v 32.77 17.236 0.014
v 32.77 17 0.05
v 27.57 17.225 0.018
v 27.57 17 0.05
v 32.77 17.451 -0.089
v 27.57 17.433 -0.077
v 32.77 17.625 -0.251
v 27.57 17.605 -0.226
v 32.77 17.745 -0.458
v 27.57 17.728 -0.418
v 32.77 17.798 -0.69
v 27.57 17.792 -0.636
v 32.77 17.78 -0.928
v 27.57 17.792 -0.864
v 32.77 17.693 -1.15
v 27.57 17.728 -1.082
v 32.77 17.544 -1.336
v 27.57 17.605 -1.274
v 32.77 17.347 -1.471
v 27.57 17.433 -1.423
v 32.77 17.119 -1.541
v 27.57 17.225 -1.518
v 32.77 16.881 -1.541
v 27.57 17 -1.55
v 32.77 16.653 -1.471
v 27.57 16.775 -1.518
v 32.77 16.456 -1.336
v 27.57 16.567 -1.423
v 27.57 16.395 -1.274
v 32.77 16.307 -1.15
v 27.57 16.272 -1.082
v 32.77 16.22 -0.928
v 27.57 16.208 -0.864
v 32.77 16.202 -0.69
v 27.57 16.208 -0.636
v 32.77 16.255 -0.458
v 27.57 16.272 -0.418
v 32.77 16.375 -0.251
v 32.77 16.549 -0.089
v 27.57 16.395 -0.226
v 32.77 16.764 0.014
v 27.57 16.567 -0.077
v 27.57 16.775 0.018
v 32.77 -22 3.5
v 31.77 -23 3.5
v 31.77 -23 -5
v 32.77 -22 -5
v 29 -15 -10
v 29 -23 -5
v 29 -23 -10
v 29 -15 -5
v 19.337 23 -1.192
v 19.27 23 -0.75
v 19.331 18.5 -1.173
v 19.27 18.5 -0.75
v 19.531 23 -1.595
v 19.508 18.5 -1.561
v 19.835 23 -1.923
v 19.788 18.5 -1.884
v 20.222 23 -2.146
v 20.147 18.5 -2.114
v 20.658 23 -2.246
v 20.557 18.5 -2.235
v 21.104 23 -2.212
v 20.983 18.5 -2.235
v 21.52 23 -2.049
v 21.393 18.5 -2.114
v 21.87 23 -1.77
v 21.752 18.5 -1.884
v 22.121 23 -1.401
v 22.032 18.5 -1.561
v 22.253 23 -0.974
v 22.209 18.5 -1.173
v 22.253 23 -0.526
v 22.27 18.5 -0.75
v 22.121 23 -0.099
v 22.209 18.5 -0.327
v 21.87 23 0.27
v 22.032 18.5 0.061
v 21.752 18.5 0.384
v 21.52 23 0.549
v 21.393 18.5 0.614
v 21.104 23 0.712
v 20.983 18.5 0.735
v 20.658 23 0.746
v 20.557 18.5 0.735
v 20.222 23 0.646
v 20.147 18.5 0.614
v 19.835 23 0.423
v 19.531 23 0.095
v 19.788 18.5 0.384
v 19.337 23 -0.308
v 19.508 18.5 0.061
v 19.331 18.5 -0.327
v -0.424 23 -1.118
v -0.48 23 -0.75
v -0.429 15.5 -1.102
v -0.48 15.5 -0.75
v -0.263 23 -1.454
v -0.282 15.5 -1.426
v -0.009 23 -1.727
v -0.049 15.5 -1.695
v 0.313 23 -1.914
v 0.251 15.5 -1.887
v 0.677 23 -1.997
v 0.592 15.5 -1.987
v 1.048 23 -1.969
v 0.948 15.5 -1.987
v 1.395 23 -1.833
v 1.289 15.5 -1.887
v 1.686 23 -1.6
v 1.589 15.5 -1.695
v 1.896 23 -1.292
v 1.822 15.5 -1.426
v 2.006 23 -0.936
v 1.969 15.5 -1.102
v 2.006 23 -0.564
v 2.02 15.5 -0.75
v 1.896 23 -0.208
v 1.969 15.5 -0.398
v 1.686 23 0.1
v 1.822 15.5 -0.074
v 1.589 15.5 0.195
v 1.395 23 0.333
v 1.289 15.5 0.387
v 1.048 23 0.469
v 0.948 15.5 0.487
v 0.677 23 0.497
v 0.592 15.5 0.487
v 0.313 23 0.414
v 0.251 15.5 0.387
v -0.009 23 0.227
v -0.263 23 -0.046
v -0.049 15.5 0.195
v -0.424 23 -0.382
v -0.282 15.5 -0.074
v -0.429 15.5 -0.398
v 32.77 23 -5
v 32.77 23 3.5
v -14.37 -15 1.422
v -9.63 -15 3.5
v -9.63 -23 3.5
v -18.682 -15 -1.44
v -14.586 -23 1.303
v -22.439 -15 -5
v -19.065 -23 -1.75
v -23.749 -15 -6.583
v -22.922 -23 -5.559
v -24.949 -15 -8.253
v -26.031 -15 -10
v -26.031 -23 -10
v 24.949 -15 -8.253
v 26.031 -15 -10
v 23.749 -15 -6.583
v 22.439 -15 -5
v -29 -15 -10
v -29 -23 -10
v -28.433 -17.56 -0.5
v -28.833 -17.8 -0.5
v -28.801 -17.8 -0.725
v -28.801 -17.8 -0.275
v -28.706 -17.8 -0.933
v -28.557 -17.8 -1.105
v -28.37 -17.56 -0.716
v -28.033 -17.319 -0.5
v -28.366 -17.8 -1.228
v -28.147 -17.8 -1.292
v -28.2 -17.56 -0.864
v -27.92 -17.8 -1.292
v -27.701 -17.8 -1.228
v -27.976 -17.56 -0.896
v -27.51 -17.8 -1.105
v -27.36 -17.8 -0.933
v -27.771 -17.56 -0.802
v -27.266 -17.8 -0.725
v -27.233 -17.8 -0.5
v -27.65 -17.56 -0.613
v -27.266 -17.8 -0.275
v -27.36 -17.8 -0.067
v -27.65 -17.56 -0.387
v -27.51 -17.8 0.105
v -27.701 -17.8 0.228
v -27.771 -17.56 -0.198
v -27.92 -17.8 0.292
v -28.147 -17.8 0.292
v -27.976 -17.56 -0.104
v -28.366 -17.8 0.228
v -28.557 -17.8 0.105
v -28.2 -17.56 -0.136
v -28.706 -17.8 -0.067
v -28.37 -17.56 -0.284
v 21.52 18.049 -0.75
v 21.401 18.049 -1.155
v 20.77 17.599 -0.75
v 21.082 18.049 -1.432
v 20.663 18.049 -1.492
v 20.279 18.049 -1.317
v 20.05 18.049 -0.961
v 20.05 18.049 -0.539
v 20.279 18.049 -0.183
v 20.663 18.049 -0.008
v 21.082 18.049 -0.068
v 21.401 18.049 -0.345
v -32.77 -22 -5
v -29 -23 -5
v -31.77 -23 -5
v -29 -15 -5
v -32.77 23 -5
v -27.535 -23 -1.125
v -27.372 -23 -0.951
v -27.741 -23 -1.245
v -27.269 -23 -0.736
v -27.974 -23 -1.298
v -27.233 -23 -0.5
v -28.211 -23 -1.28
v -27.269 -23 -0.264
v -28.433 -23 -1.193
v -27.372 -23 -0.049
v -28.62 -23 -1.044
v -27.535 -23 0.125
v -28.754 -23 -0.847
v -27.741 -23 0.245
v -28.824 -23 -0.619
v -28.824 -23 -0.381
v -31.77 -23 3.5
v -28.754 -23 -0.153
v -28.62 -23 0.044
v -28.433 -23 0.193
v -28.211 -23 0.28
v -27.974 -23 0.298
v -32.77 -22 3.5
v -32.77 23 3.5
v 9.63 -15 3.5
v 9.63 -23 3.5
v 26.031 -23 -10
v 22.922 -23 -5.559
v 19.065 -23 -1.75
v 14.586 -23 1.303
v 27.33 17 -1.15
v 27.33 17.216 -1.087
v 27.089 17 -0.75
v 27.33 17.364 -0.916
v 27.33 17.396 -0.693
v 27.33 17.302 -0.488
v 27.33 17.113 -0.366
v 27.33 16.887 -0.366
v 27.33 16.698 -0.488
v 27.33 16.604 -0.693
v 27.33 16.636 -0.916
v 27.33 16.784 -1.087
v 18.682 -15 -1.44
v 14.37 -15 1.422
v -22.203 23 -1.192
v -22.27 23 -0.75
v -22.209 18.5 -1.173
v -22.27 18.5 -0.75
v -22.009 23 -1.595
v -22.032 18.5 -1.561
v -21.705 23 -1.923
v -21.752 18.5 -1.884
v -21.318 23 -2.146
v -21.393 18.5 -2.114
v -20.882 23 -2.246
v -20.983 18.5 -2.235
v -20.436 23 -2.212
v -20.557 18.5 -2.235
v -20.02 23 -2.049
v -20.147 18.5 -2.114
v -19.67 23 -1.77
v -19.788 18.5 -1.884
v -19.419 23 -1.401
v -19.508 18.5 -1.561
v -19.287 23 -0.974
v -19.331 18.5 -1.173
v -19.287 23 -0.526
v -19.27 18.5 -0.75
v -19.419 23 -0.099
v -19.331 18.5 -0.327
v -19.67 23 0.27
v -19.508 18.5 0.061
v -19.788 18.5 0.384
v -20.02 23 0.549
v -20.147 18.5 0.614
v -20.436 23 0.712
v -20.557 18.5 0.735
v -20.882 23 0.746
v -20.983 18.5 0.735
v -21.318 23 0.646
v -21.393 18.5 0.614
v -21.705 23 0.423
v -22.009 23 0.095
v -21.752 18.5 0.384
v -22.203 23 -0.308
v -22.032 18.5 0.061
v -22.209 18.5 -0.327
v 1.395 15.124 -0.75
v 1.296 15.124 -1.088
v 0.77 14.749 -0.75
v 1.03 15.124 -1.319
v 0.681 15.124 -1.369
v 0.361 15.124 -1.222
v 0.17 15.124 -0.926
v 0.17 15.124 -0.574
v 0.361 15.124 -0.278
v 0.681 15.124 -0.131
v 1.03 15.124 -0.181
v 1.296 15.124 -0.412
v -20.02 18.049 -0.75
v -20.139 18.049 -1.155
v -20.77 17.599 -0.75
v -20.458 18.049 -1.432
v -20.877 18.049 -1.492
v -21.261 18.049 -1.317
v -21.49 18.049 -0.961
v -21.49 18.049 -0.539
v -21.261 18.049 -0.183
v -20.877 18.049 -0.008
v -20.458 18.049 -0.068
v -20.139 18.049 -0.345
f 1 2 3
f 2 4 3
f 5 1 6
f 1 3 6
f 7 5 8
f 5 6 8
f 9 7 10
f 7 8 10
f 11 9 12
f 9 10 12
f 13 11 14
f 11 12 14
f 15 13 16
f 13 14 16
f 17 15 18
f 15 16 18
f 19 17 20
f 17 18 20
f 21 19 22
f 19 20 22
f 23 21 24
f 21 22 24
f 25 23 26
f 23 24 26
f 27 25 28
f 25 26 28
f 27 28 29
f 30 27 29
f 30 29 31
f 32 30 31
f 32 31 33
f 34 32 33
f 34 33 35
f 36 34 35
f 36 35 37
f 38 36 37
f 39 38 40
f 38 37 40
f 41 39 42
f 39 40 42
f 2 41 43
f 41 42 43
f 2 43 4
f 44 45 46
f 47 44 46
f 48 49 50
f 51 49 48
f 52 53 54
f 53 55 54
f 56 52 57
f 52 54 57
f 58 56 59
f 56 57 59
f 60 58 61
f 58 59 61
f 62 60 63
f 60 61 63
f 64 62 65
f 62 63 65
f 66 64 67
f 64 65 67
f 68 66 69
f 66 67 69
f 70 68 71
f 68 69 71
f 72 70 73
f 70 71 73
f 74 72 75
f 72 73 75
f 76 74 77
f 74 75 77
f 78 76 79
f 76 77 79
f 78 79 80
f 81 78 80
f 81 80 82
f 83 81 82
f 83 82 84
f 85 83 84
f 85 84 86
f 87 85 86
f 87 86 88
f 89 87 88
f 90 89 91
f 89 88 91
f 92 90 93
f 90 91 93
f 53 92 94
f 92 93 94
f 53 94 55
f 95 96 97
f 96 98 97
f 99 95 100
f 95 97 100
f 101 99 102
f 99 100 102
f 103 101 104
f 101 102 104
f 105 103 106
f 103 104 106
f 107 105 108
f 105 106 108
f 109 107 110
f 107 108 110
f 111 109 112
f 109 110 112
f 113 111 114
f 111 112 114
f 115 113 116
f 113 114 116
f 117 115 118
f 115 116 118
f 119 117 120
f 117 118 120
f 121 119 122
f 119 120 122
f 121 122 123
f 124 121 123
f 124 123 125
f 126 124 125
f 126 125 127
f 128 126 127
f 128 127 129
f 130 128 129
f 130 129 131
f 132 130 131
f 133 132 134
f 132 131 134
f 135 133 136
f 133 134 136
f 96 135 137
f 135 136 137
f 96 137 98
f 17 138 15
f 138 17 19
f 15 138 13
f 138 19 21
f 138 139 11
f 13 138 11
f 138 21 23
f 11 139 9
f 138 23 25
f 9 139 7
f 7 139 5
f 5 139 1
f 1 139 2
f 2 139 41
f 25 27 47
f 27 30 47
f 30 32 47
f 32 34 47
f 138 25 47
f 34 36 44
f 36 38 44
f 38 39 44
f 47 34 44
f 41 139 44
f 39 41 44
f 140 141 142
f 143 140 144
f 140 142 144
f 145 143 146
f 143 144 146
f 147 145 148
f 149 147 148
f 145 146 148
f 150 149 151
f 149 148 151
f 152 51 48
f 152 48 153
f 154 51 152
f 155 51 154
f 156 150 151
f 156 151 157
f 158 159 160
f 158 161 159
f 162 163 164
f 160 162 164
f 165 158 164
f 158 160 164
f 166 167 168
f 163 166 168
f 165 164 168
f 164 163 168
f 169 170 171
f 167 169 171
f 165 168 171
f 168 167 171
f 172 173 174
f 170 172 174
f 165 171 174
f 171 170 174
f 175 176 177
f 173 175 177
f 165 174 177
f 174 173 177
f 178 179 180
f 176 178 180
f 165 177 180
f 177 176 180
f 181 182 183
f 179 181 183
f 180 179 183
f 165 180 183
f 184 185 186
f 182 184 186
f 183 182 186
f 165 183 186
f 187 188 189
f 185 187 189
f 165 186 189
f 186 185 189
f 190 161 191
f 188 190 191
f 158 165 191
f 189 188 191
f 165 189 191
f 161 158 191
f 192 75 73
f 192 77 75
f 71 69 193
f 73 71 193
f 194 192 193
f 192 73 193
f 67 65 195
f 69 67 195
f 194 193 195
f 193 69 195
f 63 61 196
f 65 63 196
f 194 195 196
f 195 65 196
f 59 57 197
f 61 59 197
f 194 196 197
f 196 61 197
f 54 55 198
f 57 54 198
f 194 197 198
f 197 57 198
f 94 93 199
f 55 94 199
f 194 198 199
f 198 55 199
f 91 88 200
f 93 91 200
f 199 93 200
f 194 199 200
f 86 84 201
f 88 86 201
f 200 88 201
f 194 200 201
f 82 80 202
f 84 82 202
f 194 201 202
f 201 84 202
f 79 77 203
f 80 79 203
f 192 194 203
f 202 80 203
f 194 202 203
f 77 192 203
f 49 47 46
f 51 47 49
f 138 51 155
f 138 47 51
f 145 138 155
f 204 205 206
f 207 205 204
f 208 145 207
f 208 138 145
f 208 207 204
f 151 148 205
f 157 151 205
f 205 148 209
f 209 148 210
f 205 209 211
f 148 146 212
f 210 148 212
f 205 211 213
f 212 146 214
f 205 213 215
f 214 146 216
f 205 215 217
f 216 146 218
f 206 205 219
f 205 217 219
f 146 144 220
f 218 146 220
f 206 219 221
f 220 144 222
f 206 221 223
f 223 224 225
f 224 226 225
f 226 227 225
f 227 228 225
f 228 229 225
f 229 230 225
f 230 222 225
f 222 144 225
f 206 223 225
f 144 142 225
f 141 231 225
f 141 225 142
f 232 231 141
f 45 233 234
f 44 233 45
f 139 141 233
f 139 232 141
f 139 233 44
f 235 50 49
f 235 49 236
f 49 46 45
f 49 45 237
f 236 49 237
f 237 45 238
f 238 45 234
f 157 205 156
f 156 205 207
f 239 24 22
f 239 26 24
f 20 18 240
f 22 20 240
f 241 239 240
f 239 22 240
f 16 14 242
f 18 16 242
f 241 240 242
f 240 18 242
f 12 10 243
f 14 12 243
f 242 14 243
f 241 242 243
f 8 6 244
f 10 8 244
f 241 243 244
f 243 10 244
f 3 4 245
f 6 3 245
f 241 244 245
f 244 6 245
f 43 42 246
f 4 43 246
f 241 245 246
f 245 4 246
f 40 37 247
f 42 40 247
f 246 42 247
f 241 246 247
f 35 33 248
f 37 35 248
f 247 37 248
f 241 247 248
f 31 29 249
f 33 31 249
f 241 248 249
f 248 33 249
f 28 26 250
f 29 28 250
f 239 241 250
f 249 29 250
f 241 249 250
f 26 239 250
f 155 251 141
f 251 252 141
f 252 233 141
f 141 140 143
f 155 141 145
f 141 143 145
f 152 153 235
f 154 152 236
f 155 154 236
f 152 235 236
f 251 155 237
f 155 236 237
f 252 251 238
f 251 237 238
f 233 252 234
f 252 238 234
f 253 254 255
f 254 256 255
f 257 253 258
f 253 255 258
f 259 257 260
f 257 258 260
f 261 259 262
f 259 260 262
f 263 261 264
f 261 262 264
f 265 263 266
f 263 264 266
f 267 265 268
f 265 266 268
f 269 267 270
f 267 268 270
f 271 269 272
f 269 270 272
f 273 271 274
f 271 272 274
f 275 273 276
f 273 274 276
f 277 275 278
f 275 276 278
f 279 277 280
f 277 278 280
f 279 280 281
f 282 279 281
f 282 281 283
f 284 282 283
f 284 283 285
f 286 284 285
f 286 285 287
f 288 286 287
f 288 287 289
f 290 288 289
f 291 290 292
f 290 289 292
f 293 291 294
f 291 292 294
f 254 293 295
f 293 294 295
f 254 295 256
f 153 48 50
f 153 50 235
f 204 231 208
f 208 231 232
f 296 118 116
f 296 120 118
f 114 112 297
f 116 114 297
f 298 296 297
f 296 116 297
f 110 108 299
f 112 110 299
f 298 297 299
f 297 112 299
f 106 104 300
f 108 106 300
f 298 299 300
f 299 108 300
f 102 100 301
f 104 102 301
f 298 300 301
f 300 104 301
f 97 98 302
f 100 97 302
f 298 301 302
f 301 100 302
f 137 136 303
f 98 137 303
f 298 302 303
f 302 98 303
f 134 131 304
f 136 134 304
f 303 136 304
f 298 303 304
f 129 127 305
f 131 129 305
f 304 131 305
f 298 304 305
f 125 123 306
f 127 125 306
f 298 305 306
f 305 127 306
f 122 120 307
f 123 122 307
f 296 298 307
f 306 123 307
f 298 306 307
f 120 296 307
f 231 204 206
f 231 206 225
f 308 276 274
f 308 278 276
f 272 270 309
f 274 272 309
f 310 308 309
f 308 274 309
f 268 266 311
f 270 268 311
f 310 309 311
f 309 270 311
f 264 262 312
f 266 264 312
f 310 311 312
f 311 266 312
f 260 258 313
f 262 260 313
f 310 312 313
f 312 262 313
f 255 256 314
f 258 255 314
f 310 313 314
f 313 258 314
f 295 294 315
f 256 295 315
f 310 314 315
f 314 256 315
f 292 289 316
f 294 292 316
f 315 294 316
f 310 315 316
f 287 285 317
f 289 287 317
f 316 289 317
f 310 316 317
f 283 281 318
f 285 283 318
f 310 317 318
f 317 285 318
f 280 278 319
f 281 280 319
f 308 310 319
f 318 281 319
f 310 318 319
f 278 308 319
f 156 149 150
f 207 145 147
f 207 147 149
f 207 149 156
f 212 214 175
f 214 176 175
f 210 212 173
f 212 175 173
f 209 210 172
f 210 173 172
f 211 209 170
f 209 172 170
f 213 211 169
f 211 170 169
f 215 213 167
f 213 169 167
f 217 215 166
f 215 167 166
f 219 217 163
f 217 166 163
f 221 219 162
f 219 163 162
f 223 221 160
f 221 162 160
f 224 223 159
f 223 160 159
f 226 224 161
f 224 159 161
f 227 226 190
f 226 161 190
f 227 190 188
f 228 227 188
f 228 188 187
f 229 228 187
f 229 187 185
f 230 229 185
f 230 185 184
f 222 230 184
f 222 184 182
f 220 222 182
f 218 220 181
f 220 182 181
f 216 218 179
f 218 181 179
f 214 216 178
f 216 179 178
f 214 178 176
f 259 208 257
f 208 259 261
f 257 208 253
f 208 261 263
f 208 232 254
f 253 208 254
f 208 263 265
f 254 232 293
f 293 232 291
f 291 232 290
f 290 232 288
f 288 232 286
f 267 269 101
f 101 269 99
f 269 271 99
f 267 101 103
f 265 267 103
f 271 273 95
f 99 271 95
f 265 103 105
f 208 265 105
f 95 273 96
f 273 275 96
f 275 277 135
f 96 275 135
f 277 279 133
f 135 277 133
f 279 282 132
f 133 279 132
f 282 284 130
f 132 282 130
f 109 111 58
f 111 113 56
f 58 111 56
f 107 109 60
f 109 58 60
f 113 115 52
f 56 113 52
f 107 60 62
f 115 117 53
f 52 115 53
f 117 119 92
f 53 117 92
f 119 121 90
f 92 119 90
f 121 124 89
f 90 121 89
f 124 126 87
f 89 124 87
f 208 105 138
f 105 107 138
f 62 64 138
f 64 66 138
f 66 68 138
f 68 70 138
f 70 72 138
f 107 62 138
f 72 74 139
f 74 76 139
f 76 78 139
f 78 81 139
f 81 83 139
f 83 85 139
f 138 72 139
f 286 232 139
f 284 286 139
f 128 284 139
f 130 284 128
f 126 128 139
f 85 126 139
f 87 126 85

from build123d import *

# Parameters (mm, degrees)
SKETCH1_W                 = 65.54
SKETCH1_H                 = 46
BOSS_EXTRUDE1_DEPTH       = 3.5
SKETCH2_W                 = 58
SKETCH2_H                 = 8
BOSS_EXTRUDE2_DEPTH       = 10
CUT_EXTRUDE1_DEPTH        = 8
BOSS_EXTRUDE3_DEPTH       = 5
CHAMFER1_SIZE             = 1
F_3_0MM_DOWEL_HOLE1_D     = 3
F_3_0MM_DOWEL_HOLE1_DEPTH = 4.5
F_3_0MM_DOWEL_HOLE1_TIP   = 0.901290929
M3X0_5_TAPPED_HOLE1_D     = 2.5
M3X0_5_TAPPED_HOLE1_DEPTH = 7.5
M3X0_5_TAPPED_HOLE1_TIP   = 0.751075774
M2X0_4_TAPPED_HOLE1_D     = 1.6
M2X0_4_TAPPED_HOLE1_DEPTH = 5.2
M2X0_4_TAPPED_HOLE1_TIP   = 0.480688495
M2X0_4_TAPPED_HOLE2_D     = 1.6
M2X0_4_TAPPED_HOLE2_DEPTH = 5.2
M2X0_4_TAPPED_HOLE2_TIP   = 0.480688495


with BuildPart() as part:
    # Sketch1 → Boss-Extrude1 (new body)
    with BuildSketch(Plane.XY):
        Rectangle(SKETCH1_W, SKETCH1_H)
    extrude(amount=BOSS_EXTRUDE1_DEPTH)

    # Sketch2 → Boss-Extrude2 (add)
    with BuildSketch(Plane(origin=(0, 0, 0), x_dir=(-1, 0, 0), z_dir=(0, 0, -1))):
        with Locations((0, -19)):
            Rectangle(SKETCH2_W, SKETCH2_H)
    extrude(amount=BOSS_EXTRUDE2_DEPTH)

    # Sketch5 → Cut-Extrude1 (cut)
    with BuildSketch(Plane.XZ.offset(23)):
        with BuildLine():
            Line((-26.311212976, -10.5), (26.311212976, -10.5))
            ThreePointArc((26.311212976, -10.5), (19.200628572, -1.861773381), (9.41946352, 3.570369836))
            Line((9.41946352, 3.570369836), (9.41946352, 4))
            Line((9.41946352, 4), (-9.622947545, 4))
            Line((-9.622947545, 4), (-9.622947545, 3.502268118))
            ThreePointArc((-9.622947545, 3.502268118), (-19.282941975, -1.930587904), (-26.311212976, -10.5))
        make_face()
    extrude(amount=-CUT_EXTRUDE1_DEPTH, mode=Mode.SUBTRACT)

    # Sketch6 → Boss-Extrude3 (add)
    with BuildSketch(Plane(origin=(0, 0, 0), x_dir=(-1, 0, 0), z_dir=(0, 0, -1))):
        Polygon((-32.77, 23), (-32.77, -23), (-29, -23), (-29, -15), (29, -15), (29, -23), (32.77, -23), (32.77, 23), align=None)
    extrude(amount=BOSS_EXTRUDE3_DEPTH)

    # Chamfer1
    chamfer1_edges = [part.edges().sort_by_distance(p)[0] for p in [
        (32.77, -23, -0.75),
        (-32.77, -23, -0.75),
    ]]
    chamfer(chamfer1_edges, length=CHAMFER1_SIZE)

    # Ø3.0mm Dowel Hole1
    with Locations(Plane(origin=(0, 23, 0), x_dir=(1, 0, 0), z_dir=(0, 1, 0))):
        with Locations((-20.77, 0.75), (20.77, 0.75)):
            Hole(F_3_0MM_DOWEL_HOLE1_D / 2, depth=F_3_0MM_DOWEL_HOLE1_DEPTH)
            with Locations((0, 0, -(F_3_0MM_DOWEL_HOLE1_DEPTH + F_3_0MM_DOWEL_HOLE1_TIP / 2))):  # 118° drill point
                Cone(0, F_3_0MM_DOWEL_HOLE1_D / 2, F_3_0MM_DOWEL_HOLE1_TIP, mode=Mode.SUBTRACT)

    # M3x0.5 Tapped Hole1
    with Locations(Plane(origin=(0, 23, 0), x_dir=(1, 0, 0), z_dir=(0, 1, 0))):
        with Locations((0.77, 0.75)):
            Hole(M3X0_5_TAPPED_HOLE1_D / 2, depth=M3X0_5_TAPPED_HOLE1_DEPTH)
            with Locations((0, 0, -(M3X0_5_TAPPED_HOLE1_DEPTH + M3X0_5_TAPPED_HOLE1_TIP / 2))):  # 118° drill point
                Cone(0, M3X0_5_TAPPED_HOLE1_D / 2, M3X0_5_TAPPED_HOLE1_TIP, mode=Mode.SUBTRACT)

    # M2x0.4 Tapped Hole1
    with Locations(Plane(origin=(0, -23, 0), x_dir=(-1, 0, 0), z_dir=(0, -1, 0))):
        with Locations((28.0334, 0.5)):
            Hole(M2X0_4_TAPPED_HOLE1_D / 2, depth=M2X0_4_TAPPED_HOLE1_DEPTH)
            with Locations((0, 0, -(M2X0_4_TAPPED_HOLE1_DEPTH + M2X0_4_TAPPED_HOLE1_TIP / 2))):  # 118° drill point
                Cone(0, M2X0_4_TAPPED_HOLE1_D / 2, M2X0_4_TAPPED_HOLE1_TIP, mode=Mode.SUBTRACT)

    # M2x0.4 Tapped Hole2
    with Locations(Plane(origin=(32.77, 0, 0), x_dir=(0, 0, -1), z_dir=(1, 0, 0))):
        with Locations((0.75, 17)):
            Hole(M2X0_4_TAPPED_HOLE2_D / 2, depth=M2X0_4_TAPPED_HOLE2_DEPTH)
            with Locations((0, 0, -(M2X0_4_TAPPED_HOLE2_DEPTH + M2X0_4_TAPPED_HOLE2_TIP / 2))):  # 118° drill point
                Cone(0, M2X0_4_TAPPED_HOLE2_D / 2, M2X0_4_TAPPED_HOLE2_TIP, mode=Mode.SUBTRACT)


solid = part.part
